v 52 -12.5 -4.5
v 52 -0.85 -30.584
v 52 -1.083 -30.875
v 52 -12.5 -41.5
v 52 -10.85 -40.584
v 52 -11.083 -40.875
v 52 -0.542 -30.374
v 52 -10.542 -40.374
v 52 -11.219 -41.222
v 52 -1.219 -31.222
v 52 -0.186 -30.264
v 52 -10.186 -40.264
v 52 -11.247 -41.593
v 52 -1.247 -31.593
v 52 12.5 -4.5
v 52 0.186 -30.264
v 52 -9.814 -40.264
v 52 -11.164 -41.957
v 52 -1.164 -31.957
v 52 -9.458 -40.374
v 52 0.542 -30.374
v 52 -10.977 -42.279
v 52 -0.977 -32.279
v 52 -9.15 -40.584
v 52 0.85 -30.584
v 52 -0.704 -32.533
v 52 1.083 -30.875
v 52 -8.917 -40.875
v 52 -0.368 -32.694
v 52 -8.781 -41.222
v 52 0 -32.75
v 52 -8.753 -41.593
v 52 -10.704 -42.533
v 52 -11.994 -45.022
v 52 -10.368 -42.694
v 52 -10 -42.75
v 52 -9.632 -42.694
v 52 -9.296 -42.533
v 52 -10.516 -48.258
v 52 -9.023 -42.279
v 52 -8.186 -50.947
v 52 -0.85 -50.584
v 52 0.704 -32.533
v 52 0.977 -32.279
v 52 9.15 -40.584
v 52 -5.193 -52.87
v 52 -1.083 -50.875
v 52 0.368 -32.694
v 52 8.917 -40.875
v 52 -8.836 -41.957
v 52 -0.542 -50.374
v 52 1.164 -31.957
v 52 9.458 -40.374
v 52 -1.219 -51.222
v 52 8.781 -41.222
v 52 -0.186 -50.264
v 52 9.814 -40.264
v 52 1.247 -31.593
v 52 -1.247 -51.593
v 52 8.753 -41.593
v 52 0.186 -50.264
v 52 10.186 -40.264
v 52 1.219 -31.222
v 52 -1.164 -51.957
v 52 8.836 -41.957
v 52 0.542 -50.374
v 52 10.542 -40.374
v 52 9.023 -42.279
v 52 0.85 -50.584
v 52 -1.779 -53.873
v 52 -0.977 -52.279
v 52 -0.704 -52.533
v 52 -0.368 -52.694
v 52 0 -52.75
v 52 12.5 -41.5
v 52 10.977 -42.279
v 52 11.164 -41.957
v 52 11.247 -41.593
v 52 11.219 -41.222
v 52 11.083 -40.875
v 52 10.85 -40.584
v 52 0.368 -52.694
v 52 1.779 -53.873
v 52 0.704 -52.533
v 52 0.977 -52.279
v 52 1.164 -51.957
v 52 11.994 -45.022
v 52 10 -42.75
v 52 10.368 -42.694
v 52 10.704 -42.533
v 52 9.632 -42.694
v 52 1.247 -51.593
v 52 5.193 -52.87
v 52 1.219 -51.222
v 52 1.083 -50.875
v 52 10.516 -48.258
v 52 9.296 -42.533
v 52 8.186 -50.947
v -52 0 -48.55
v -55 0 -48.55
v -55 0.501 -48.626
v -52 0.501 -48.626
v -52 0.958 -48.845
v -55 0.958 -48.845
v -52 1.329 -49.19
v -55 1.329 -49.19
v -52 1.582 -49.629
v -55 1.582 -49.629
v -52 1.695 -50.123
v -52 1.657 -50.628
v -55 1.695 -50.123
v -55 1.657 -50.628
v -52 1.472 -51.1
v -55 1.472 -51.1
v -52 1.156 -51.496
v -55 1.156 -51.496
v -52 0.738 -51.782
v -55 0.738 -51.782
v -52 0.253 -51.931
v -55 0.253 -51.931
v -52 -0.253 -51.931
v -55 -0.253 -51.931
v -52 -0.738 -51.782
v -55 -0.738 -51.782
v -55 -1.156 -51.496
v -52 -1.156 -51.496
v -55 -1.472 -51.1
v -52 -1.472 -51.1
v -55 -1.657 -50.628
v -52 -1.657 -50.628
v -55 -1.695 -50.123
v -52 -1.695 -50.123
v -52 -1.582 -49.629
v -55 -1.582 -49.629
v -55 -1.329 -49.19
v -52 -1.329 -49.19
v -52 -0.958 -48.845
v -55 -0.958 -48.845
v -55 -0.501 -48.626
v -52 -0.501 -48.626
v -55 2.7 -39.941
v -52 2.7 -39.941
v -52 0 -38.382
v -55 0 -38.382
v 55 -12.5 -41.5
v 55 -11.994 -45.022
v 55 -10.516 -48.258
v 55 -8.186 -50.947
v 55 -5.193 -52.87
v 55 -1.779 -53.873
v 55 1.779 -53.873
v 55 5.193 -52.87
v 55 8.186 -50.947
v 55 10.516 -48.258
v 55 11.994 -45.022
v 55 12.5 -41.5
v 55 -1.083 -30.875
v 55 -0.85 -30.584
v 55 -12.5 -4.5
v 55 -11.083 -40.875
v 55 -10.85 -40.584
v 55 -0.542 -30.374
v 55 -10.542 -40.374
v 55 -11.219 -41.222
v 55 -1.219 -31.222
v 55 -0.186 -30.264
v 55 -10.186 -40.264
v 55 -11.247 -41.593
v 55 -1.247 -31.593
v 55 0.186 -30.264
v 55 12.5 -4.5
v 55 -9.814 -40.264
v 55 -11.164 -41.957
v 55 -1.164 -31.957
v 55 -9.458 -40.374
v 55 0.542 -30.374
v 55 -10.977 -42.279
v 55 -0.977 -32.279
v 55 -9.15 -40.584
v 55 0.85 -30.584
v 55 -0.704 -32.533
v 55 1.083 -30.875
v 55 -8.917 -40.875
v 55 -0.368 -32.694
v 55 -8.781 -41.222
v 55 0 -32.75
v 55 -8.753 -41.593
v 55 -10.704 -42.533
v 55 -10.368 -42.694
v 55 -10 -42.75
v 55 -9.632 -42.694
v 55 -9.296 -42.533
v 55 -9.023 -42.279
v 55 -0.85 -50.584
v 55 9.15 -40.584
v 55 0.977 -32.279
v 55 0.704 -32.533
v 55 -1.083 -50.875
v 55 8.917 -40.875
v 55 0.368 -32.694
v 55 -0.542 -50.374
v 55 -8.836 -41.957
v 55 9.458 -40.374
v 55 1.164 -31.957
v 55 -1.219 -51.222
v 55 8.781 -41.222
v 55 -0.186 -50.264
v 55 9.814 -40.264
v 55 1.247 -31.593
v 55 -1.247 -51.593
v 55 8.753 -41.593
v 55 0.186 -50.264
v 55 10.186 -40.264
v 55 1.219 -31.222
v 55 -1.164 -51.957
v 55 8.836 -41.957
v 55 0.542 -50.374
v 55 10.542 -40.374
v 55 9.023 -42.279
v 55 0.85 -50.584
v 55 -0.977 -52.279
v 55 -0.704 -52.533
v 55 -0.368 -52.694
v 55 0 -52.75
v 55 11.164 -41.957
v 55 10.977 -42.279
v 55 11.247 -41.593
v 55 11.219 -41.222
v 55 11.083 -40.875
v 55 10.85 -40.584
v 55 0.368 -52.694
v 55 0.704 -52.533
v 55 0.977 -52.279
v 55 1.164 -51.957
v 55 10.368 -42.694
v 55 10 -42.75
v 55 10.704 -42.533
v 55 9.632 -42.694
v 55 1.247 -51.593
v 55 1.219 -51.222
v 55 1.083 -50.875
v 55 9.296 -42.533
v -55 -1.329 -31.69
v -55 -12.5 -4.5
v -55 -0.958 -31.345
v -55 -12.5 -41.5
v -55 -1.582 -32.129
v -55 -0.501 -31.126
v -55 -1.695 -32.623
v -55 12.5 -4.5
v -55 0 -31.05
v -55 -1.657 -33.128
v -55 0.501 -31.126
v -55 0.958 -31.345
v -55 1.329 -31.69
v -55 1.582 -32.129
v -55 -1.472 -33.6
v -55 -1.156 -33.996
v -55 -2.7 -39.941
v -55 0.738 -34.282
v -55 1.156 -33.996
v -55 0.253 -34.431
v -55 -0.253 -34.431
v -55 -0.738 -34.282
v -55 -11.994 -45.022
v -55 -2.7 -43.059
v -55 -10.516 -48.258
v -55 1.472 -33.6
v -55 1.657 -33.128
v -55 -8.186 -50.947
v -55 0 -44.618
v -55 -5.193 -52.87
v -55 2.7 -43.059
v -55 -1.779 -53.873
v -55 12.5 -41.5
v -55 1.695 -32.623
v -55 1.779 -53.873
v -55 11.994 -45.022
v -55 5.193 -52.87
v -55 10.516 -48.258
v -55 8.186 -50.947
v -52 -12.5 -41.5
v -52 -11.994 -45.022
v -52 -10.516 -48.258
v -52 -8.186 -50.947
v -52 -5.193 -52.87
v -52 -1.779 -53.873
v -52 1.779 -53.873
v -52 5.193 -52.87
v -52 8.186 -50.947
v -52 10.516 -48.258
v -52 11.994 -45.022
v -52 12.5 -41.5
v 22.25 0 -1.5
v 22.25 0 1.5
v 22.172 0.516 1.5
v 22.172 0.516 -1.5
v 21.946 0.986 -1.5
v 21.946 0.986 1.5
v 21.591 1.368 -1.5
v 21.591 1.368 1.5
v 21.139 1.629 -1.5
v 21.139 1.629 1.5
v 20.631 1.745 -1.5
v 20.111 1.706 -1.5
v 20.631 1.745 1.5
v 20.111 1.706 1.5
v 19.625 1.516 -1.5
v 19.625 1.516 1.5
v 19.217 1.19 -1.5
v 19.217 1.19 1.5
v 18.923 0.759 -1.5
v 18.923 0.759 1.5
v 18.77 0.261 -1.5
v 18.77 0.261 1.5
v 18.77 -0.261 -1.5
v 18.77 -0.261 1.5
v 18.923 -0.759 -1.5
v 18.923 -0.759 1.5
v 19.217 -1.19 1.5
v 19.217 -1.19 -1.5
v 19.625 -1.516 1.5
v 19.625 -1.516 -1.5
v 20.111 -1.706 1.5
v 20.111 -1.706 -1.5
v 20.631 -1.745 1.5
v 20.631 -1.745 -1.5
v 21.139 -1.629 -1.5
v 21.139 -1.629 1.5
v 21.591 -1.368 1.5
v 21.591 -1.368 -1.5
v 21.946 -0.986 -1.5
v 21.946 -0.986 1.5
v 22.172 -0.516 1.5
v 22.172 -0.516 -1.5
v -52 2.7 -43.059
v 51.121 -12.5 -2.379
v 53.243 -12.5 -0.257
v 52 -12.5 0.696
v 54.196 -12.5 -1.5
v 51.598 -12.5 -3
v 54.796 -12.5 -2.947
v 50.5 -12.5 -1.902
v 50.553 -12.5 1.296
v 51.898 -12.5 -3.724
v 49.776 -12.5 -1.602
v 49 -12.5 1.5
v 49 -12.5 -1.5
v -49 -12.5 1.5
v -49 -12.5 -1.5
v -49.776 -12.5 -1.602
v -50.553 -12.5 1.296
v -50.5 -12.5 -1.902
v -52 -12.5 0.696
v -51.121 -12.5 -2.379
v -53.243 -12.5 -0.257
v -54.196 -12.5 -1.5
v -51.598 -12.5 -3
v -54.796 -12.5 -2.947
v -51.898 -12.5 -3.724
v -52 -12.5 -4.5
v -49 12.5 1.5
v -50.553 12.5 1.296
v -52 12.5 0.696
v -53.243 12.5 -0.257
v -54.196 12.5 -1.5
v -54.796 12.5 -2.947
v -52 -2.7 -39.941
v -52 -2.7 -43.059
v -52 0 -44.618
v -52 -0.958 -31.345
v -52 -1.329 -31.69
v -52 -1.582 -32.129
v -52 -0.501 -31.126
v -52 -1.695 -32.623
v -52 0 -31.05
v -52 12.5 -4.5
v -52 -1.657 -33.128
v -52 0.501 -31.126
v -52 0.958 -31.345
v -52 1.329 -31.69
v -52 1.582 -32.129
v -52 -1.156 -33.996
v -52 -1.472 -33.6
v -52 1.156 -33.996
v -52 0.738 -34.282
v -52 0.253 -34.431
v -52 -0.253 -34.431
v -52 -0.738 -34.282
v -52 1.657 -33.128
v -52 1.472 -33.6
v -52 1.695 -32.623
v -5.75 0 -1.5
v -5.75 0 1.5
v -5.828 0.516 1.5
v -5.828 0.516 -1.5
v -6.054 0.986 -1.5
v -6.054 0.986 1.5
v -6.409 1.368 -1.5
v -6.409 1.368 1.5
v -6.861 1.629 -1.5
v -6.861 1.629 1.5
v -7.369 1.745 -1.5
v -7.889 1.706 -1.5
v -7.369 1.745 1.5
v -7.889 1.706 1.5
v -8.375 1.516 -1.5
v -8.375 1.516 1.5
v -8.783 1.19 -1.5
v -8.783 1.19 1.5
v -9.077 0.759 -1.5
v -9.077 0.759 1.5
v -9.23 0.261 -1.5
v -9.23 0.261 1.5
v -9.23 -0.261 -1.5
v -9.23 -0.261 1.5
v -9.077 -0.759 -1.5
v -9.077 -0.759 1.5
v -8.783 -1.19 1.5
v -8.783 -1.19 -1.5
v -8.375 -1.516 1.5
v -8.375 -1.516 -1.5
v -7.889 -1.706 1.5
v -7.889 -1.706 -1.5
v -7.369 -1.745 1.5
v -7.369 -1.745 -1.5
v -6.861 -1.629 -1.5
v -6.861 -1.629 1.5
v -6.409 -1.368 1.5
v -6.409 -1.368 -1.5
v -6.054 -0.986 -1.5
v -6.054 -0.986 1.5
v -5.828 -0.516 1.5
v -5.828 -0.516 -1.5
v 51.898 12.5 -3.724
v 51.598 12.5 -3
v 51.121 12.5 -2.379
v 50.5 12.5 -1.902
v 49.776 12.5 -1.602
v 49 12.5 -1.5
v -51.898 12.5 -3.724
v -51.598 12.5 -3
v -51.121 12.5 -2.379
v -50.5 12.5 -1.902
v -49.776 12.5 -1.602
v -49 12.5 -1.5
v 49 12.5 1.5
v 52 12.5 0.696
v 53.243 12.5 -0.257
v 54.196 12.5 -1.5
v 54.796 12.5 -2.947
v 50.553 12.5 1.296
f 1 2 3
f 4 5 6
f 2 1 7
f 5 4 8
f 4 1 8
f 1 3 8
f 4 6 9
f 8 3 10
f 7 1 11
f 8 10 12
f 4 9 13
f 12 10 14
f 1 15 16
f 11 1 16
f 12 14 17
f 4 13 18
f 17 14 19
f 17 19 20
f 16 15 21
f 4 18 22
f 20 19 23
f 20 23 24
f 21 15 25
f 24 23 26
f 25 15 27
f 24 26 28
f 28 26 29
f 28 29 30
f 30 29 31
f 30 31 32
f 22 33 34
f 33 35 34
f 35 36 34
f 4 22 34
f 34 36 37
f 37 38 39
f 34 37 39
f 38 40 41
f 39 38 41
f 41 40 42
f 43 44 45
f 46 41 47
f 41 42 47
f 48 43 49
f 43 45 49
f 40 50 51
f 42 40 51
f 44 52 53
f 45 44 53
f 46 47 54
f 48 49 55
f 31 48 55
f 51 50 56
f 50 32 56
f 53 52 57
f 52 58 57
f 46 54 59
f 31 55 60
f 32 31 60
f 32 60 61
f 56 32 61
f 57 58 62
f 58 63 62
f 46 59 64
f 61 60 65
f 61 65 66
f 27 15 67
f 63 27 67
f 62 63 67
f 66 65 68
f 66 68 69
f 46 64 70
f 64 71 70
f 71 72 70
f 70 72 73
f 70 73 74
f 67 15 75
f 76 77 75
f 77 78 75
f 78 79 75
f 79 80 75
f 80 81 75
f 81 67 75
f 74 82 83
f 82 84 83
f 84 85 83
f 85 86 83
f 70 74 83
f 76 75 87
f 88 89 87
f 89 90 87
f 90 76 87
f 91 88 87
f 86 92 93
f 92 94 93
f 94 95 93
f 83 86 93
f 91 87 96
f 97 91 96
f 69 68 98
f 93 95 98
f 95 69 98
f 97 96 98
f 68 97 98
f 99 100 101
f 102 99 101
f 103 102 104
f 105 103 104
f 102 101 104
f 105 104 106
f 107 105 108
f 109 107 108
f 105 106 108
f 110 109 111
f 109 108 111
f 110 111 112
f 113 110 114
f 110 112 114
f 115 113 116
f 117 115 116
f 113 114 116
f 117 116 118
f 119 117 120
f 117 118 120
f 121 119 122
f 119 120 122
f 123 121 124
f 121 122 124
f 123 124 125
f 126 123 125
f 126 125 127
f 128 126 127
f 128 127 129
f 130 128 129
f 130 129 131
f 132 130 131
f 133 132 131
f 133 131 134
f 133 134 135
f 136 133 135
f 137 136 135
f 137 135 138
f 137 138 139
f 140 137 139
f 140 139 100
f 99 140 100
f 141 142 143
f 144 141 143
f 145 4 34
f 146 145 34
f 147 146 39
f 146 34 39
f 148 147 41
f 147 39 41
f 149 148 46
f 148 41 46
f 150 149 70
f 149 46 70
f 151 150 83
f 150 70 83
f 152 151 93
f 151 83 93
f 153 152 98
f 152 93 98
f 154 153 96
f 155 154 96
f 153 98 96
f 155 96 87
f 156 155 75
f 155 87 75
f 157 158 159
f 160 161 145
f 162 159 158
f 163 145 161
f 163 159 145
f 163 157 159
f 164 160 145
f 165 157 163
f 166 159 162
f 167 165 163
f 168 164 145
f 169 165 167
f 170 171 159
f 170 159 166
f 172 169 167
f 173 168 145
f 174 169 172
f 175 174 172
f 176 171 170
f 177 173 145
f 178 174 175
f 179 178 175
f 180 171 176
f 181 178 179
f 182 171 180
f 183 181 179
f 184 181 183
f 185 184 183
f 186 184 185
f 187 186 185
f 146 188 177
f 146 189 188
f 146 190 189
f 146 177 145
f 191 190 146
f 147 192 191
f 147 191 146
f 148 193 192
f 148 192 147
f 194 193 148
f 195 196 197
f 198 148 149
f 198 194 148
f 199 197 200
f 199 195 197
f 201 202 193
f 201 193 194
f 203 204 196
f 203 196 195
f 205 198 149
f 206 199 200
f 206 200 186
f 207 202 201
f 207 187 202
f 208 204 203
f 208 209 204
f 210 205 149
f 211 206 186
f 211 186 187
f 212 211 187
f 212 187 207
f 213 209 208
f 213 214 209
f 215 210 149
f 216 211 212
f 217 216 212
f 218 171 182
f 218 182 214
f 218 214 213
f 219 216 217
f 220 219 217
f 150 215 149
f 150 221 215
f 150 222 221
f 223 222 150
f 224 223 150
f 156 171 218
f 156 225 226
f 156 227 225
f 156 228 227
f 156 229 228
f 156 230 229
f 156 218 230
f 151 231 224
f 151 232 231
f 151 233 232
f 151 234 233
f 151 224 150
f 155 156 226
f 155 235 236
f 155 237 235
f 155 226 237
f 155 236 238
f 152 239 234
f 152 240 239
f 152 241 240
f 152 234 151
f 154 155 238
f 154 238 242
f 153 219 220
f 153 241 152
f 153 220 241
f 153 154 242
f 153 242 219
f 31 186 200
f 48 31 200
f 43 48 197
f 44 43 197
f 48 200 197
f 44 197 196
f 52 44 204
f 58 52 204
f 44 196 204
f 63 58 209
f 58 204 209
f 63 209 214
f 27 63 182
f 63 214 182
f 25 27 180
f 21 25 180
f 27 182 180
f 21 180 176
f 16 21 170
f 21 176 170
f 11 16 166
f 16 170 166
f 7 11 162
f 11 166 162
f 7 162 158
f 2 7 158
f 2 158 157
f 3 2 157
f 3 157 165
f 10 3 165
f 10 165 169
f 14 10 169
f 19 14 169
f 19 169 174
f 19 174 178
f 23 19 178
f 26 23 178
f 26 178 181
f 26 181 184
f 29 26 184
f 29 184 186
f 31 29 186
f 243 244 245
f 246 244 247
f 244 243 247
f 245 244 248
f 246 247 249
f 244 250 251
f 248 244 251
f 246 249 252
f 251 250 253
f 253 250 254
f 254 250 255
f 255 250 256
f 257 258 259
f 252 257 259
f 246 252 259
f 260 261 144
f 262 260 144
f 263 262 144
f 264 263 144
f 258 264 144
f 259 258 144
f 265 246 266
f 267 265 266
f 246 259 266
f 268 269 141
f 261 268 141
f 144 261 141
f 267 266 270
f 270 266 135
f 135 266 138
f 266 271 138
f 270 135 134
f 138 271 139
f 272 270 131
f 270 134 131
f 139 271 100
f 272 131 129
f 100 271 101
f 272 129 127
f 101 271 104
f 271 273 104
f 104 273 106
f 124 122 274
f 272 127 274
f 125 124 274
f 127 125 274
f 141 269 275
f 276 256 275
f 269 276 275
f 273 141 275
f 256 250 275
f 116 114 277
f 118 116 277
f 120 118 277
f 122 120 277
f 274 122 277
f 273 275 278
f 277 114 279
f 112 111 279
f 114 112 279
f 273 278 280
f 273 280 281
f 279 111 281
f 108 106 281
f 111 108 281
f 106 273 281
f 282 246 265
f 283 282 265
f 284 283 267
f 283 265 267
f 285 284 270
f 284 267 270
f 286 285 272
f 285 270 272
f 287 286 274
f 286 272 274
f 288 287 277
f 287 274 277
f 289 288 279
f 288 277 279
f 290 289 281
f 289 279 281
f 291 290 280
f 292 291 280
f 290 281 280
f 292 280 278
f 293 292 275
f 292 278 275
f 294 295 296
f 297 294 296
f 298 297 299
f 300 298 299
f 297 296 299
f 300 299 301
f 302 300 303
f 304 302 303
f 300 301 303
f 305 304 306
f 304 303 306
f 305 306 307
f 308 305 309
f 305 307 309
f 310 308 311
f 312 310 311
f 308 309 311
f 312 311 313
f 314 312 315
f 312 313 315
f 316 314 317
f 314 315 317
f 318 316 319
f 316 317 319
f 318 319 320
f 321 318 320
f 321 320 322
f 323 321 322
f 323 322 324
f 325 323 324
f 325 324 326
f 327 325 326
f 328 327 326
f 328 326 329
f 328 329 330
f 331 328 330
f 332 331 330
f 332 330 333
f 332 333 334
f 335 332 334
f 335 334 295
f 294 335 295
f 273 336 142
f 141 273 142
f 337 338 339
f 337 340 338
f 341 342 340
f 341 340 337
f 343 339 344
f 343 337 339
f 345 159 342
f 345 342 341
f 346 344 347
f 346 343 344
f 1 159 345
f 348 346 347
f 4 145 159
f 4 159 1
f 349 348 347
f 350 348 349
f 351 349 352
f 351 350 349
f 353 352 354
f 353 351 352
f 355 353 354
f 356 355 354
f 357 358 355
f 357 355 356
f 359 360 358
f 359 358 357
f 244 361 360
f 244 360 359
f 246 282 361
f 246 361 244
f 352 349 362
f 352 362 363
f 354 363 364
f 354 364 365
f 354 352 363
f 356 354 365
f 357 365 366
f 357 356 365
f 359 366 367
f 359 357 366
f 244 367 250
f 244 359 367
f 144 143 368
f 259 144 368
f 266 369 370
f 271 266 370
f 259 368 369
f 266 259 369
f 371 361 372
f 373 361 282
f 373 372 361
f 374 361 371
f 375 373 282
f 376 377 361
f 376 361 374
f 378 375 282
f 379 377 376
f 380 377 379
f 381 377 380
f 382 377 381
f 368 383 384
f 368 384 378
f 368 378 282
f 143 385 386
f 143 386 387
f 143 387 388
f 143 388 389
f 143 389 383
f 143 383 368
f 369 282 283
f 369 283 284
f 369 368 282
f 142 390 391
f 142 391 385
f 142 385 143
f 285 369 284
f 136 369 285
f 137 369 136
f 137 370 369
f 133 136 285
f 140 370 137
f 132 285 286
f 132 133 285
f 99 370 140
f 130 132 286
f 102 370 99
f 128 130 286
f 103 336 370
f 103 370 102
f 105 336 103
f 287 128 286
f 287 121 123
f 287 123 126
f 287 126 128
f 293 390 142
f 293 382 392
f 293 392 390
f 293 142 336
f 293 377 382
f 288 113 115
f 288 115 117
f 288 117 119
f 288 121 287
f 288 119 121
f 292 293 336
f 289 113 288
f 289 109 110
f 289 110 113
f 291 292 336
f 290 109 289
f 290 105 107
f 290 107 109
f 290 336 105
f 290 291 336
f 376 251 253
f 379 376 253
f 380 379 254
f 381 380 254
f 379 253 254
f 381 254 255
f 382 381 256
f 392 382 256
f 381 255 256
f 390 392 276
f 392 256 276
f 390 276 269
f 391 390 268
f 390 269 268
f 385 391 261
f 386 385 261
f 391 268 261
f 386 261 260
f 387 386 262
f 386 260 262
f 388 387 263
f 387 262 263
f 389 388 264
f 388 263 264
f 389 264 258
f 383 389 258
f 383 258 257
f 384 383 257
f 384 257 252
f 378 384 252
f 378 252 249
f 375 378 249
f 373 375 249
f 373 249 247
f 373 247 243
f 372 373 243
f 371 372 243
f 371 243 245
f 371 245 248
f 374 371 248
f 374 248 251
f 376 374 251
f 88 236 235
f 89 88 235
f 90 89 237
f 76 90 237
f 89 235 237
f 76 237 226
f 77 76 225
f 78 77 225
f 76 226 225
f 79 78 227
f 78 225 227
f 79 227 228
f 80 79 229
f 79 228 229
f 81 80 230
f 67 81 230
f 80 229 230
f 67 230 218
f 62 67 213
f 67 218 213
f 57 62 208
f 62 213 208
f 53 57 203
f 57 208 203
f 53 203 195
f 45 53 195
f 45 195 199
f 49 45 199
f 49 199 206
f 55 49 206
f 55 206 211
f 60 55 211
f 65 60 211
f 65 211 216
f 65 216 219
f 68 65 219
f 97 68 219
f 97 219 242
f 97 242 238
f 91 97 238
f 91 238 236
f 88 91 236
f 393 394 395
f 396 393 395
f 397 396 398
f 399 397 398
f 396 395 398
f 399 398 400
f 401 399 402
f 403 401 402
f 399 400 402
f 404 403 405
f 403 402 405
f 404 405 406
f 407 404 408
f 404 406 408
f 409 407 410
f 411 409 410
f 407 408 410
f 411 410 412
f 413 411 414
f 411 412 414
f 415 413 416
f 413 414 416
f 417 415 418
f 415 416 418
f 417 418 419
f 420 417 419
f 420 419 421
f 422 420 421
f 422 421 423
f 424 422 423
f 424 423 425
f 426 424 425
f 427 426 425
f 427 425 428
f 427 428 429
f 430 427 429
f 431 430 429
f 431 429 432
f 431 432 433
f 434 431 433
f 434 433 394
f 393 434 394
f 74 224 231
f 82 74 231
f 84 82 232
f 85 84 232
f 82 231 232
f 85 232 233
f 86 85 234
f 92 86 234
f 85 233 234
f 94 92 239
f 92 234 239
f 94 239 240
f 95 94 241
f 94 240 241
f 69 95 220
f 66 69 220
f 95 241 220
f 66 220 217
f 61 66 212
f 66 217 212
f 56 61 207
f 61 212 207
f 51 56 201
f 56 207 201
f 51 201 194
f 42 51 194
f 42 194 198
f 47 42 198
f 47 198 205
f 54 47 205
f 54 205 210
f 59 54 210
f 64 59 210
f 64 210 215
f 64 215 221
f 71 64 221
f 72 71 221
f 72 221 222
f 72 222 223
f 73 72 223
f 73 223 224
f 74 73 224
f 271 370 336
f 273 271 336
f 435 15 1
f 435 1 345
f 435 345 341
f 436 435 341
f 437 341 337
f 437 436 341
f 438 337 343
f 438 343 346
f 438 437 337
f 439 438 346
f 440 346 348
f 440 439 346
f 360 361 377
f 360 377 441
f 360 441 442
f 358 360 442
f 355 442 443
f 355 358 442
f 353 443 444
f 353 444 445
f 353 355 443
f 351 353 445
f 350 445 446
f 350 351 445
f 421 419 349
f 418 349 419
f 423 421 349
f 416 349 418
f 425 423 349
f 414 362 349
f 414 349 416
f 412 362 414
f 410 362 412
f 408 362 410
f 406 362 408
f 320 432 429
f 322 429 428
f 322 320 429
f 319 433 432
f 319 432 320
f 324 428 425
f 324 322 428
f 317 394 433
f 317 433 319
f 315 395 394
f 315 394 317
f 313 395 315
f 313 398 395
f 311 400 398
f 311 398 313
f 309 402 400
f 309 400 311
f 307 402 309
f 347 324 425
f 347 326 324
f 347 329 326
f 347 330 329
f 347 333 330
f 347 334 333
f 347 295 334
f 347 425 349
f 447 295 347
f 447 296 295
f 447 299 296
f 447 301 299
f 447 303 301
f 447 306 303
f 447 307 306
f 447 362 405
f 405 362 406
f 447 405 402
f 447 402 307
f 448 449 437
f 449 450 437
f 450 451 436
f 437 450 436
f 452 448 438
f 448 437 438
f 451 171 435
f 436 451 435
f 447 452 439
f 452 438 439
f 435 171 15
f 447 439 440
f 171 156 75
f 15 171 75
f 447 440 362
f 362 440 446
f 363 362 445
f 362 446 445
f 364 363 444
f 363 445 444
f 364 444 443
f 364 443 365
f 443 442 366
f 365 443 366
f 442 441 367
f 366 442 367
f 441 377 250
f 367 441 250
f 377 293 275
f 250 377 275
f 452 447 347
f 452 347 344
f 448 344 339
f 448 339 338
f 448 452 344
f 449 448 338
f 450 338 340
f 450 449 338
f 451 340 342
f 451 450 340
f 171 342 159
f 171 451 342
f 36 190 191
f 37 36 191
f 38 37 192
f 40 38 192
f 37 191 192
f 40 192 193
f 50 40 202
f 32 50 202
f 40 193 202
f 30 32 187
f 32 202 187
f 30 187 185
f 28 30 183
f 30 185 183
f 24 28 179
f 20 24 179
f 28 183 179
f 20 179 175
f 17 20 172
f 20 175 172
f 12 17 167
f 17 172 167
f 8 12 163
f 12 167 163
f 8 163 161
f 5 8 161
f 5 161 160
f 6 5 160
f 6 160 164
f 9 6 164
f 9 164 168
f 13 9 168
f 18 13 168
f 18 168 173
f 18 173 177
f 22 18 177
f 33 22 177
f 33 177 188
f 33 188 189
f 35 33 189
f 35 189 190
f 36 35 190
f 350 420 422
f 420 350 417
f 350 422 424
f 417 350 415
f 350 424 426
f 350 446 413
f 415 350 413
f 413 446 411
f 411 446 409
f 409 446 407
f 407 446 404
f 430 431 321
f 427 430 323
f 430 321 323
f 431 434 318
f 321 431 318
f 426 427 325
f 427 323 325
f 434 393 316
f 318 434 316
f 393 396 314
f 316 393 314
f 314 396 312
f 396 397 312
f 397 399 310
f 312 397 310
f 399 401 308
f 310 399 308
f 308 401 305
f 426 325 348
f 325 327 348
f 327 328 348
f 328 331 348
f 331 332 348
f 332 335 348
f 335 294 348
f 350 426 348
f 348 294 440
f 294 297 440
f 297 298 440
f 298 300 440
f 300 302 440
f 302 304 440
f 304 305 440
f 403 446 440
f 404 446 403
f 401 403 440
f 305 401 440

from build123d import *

# Parameters (mm, degrees)
T_LE_START                            = -1.5
T_LE_DE_BASE_PLI_E2_OUTLINE_W         = 104
T_LE_DE_BASE_PLI_E2_OUTLINE_H         = 25
T_LE_DE_BASE_PLI_E2_DEPTH             = 3
T_LE_PLI_E_SUR_AR_TE1_STRIP_W         = 18
T_LE_PLI_E_SUR_AR_TE1_STRIP_H         = 3
T_LE_PLI_E_SUR_AR_TE1_STRIP_CUT_DEPTH = 25
T_LE_PLI_E_SUR_AR_TE1_DEPTH           = 25
T_LE_PLI_E_SUR_AR_TE2_STRIP_W         = 18
T_LE_PLI_E_SUR_AR_TE2_STRIP_H         = 3
T_LE_PLI_E_SUR_AR_TE2_STRIP_CUT_DEPTH = 25
T_LE_PLI_E_SUR_AR_TE2_DEPTH           = 25
ENL_V_MAT_EXTRU_1_REACH               = 72.924
ESQUISSE20_R                          = 1.75
PATTE1_DEPTH                          = 3
PATTE2_START                          = -3
PATTE2_DEPTH                          = 3
ENL_V_MAT_EXTRU_2_REACH               = 125.176
ESQUISSE27_R                          = 1.25
ENL_V_MAT_EXTRU_3_REACH               = 122.504
ENL_V_MAT_EXTRU_4_REACH               = 125.176
ESQUISSE29_R                          = 1.7


# Read off the part's stored shape, not the designer's step: Tôle de base pliée2
# Sheet-metal steps are written as plain solids
with BuildPart() as part:
    # Tôle de base pliée2 outline → Tôle de base pliée2 (new body)
    with BuildSketch(Plane.XY.offset(T_LE_START)):
        Rectangle(T_LE_DE_BASE_PLI_E2_OUTLINE_W, T_LE_DE_BASE_PLI_E2_OUTLINE_H)
    extrude(amount=T_LE_DE_BASE_PLI_E2_DEPTH)

    # Tôle pliée sur arête1 strip (across the edge) → Tôle pliée sur arête1 strip cut (cut)
    with BuildSketch(Plane(origin=(52, 12.5, -1.5), x_dir=(-1, 0, 0), z_dir=(0, -1, 0))):
        with Locations((-6, -1.5)):
            Rectangle(T_LE_PLI_E_SUR_AR_TE1_STRIP_W, T_LE_PLI_E_SUR_AR_TE1_STRIP_H)
    extrude(amount=T_LE_PLI_E_SUR_AR_TE1_STRIP_CUT_DEPTH, mode=Mode.SUBTRACT)

    # Tôle pliée sur arête1 section (across the edge) → Tôle pliée sur arête1 (add)
    with BuildSketch(Plane(origin=(52, 12.5, -1.5), x_dir=(-1, 0, 0), z_dir=(0, -1, 0))):
        with BuildLine():
            Line((-3, 3), (-3, 40))
            Line((-3, 40), (0, 40))
            Line((0, 40), (0, 3))
            ThreePointArc((0, 3), (0.878679656, 0.878679656), (3, 0))
            Line((3, 0), (3, -3))
            ThreePointArc((3, -3), (-1.242640687, -1.242640687), (-3, 3))
        make_face()
    extrude(amount=T_LE_PLI_E_SUR_AR_TE1_DEPTH)

    # Tôle pliée sur arête2 strip (across the edge) → Tôle pliée sur arête2 strip cut (cut)
    with BuildSketch(Plane(origin=(-52, -12.5, -1.5), x_dir=(1, 0, 0), z_dir=(0, 1, 0))):
        with Locations((-6, -1.5)):
            Rectangle(T_LE_PLI_E_SUR_AR_TE2_STRIP_W, T_LE_PLI_E_SUR_AR_TE2_STRIP_H)
    extrude(amount=T_LE_PLI_E_SUR_AR_TE2_STRIP_CUT_DEPTH, mode=Mode.SUBTRACT)

    # Tôle pliée sur arête2 section (across the edge) → Tôle pliée sur arête2 (add)
    with BuildSketch(Plane(origin=(-52, -12.5, -1.5), x_dir=(1, 0, 0), z_dir=(0, 1, 0))):
        with BuildLine():
            Line((-3, 3), (-3, 40))
            Line((-3, 40), (0, 40))
            Line((0, 40), (0, 3))
            ThreePointArc((0, 3), (0.878679656, 0.878679656), (3, 0))
            Line((3, 0), (3, -3))
            ThreePointArc((3, -3), (-1.242640687, -1.242640687), (-3, 3))
        make_face()
    extrude(amount=T_LE_PLI_E_SUR_AR_TE2_DEPTH)

    # Esquisse20 → Enlèv. mat.-Extru.1 (cut, up to next)
    with BuildSketch(Plane.XY.offset(1.5), mode=Mode.PRIVATE) as enl_v_mat_extru_1_sk1:
        with Locations((-7.5, 0)):
            Circle(ESQUISSE20_R)
    enl_v_mat_extru_1_tool1 = extrude(enl_v_mat_extru_1_sk1.sketch, amount=-ENL_V_MAT_EXTRU_1_REACH, mode=Mode.PRIVATE) & part.part
    # Esquisse20 → Enlèv. mat.-Extru.1 (cut, up to next)
    with BuildSketch(Plane.XY.offset(1.5), mode=Mode.PRIVATE) as enl_v_mat_extru_1_sk2:
        with Locations((20.5, 0)):
            Circle(ESQUISSE20_R)
    enl_v_mat_extru_1_tool2 = extrude(enl_v_mat_extru_1_sk2.sketch, amount=-ENL_V_MAT_EXTRU_1_REACH, mode=Mode.PRIVATE) & part.part
    add(enl_v_mat_extru_1_tool1.solids().sort_by_distance((-7.5, 0, 1.5))[0], mode=Mode.SUBTRACT)
    add(enl_v_mat_extru_1_tool2.solids().sort_by_distance((20.5, 0, 1.5))[0], mode=Mode.SUBTRACT)

    # Esquisse21 → Patte1 (add)
    with BuildSketch(Plane.ZY.offset(55)):
        with BuildLine():
            Line((-41.5, 12.5), (-41.5, -12.5))
            ThreePointArc((-41.5, -12.5), (-54, 0), (-41.5, 12.5))
        make_face()
    extrude(amount=-PATTE1_DEPTH)

    # Esquisse24 → Patte2 (add)
    with BuildSketch(Plane(origin=(55, 0, 0), x_dir=(0, 0, -1), z_dir=(1, 0, 0)).offset(PATTE2_START)):
        with BuildLine():
            Line((41.5, 12.5), (41.5, -12.5))
            ThreePointArc((41.5, -12.5), (54, 0), (41.5, 12.5))
        make_face()
    extrude(amount=PATTE2_DEPTH)

    # Esquisse27 → Enlèv. mat.-Extru.2 (cut, up to next)
    with BuildSketch(Plane(origin=(55, 0, 0), x_dir=(0, 0, -1), z_dir=(1, 0, 0)), mode=Mode.PRIVATE) as enl_v_mat_extru_2_sk1:
        with Locations((51.5, 0)):
            Circle(ESQUISSE27_R)
    enl_v_mat_extru_2_tool1 = extrude(enl_v_mat_extru_2_sk1.sketch, amount=-ENL_V_MAT_EXTRU_2_REACH, mode=Mode.PRIVATE) & part.part
    # Esquisse27 → Enlèv. mat.-Extru.2 (cut, up to next)
    with BuildSketch(Plane(origin=(55, 0, 0), x_dir=(0, 0, -1), z_dir=(1, 0, 0)), mode=Mode.PRIVATE) as enl_v_mat_extru_2_sk2:
        with Locations((41.5, -10)):
            Circle(ESQUISSE27_R)
    enl_v_mat_extru_2_tool2 = extrude(enl_v_mat_extru_2_sk2.sketch, amount=-ENL_V_MAT_EXTRU_2_REACH, mode=Mode.PRIVATE) & part.part
    # Esquisse27 → Enlèv. mat.-Extru.2 (cut, up to next)
    with BuildSketch(Plane(origin=(55, 0, 0), x_dir=(0, 0, -1), z_dir=(1, 0, 0)), mode=Mode.PRIVATE) as enl_v_mat_extru_2_sk3:
        with Locations((31.5, 0)):
            Circle(ESQUISSE27_R)
    enl_v_mat_extru_2_tool3 = extrude(enl_v_mat_extru_2_sk3.sketch, amount=-ENL_V_MAT_EXTRU_2_REACH, mode=Mode.PRIVATE) & part.part
    # Esquisse27 → Enlèv. mat.-Extru.2 (cut, up to next)
    with BuildSketch(Plane(origin=(55, 0, 0), x_dir=(0, 0, -1), z_dir=(1, 0, 0)), mode=Mode.PRIVATE) as enl_v_mat_extru_2_sk4:
        with Locations((41.5, 10)):
            Circle(ESQUISSE27_R)
    enl_v_mat_extru_2_tool4 = extrude(enl_v_mat_extru_2_sk4.sketch, amount=-ENL_V_MAT_EXTRU_2_REACH, mode=Mode.PRIVATE) & part.part
    add(enl_v_mat_extru_2_tool1.solids().sort_by_distance((55, 0, -51.5))[0], mode=Mode.SUBTRACT)
    add(enl_v_mat_extru_2_tool2.solids().sort_by_distance((55, -10, -41.5))[0], mode=Mode.SUBTRACT)
    add(enl_v_mat_extru_2_tool3.solids().sort_by_distance((55, 0, -31.5))[0], mode=Mode.SUBTRACT)
    add(enl_v_mat_extru_2_tool4.solids().sort_by_distance((55, 10, -41.5))[0], mode=Mode.SUBTRACT)

    # Esquisse28 → Enlèv. mat.-Extru.3 (cut, up to next)
    with BuildSketch(Plane(origin=(-52, 0, 0), x_dir=(0, 0, -1), z_dir=(1, 0, 0)), mode=Mode.PRIVATE) as enl_v_mat_extru_3_sk1:
        Polygon((43.058845727, -2.7), (44.617691454, 0), (43.058845727, 2.7), (39.941154273, 2.7), (38.382308546, 0), (39.941154273, -2.7), align=None)
    enl_v_mat_extru_3_tool1 = extrude(enl_v_mat_extru_3_sk1.sketch, amount=-ENL_V_MAT_EXTRU_3_REACH, mode=Mode.PRIVATE) & part.part
    add(enl_v_mat_extru_3_tool1.solids().sort_by_distance((-52, 0, -41.5))[0], mode=Mode.SUBTRACT)

    # Esquisse29 → Enlèv. mat.-Extru.4 (cut, up to next)
    with BuildSketch(Plane.ZY.offset(55), mode=Mode.PRIVATE) as enl_v_mat_extru_4_sk1:
        with Locations((-50.25, 0)):
            Circle(ESQUISSE29_R)
    enl_v_mat_extru_4_tool1 = extrude(enl_v_mat_extru_4_sk1.sketch, amount=-ENL_V_MAT_EXTRU_4_REACH, mode=Mode.PRIVATE) & part.part
    # Esquisse29 → Enlèv. mat.-Extru.4 (cut, up to next)
    with BuildSketch(Plane.ZY.offset(55), mode=Mode.PRIVATE) as enl_v_mat_extru_4_sk2:
        with Locations((-32.75, 0)):
            Circle(ESQUISSE29_R)
    enl_v_mat_extru_4_tool2 = extrude(enl_v_mat_extru_4_sk2.sketch, amount=-ENL_V_MAT_EXTRU_4_REACH, mode=Mode.PRIVATE) & part.part
    add(enl_v_mat_extru_4_tool1.solids().sort_by_distance((-55, 0, -50.25))[0], mode=Mode.SUBTRACT)
    add(enl_v_mat_extru_4_tool2.solids().sort_by_distance((-55, 0, -32.75))[0], mode=Mode.SUBTRACT)


solid = part.part
